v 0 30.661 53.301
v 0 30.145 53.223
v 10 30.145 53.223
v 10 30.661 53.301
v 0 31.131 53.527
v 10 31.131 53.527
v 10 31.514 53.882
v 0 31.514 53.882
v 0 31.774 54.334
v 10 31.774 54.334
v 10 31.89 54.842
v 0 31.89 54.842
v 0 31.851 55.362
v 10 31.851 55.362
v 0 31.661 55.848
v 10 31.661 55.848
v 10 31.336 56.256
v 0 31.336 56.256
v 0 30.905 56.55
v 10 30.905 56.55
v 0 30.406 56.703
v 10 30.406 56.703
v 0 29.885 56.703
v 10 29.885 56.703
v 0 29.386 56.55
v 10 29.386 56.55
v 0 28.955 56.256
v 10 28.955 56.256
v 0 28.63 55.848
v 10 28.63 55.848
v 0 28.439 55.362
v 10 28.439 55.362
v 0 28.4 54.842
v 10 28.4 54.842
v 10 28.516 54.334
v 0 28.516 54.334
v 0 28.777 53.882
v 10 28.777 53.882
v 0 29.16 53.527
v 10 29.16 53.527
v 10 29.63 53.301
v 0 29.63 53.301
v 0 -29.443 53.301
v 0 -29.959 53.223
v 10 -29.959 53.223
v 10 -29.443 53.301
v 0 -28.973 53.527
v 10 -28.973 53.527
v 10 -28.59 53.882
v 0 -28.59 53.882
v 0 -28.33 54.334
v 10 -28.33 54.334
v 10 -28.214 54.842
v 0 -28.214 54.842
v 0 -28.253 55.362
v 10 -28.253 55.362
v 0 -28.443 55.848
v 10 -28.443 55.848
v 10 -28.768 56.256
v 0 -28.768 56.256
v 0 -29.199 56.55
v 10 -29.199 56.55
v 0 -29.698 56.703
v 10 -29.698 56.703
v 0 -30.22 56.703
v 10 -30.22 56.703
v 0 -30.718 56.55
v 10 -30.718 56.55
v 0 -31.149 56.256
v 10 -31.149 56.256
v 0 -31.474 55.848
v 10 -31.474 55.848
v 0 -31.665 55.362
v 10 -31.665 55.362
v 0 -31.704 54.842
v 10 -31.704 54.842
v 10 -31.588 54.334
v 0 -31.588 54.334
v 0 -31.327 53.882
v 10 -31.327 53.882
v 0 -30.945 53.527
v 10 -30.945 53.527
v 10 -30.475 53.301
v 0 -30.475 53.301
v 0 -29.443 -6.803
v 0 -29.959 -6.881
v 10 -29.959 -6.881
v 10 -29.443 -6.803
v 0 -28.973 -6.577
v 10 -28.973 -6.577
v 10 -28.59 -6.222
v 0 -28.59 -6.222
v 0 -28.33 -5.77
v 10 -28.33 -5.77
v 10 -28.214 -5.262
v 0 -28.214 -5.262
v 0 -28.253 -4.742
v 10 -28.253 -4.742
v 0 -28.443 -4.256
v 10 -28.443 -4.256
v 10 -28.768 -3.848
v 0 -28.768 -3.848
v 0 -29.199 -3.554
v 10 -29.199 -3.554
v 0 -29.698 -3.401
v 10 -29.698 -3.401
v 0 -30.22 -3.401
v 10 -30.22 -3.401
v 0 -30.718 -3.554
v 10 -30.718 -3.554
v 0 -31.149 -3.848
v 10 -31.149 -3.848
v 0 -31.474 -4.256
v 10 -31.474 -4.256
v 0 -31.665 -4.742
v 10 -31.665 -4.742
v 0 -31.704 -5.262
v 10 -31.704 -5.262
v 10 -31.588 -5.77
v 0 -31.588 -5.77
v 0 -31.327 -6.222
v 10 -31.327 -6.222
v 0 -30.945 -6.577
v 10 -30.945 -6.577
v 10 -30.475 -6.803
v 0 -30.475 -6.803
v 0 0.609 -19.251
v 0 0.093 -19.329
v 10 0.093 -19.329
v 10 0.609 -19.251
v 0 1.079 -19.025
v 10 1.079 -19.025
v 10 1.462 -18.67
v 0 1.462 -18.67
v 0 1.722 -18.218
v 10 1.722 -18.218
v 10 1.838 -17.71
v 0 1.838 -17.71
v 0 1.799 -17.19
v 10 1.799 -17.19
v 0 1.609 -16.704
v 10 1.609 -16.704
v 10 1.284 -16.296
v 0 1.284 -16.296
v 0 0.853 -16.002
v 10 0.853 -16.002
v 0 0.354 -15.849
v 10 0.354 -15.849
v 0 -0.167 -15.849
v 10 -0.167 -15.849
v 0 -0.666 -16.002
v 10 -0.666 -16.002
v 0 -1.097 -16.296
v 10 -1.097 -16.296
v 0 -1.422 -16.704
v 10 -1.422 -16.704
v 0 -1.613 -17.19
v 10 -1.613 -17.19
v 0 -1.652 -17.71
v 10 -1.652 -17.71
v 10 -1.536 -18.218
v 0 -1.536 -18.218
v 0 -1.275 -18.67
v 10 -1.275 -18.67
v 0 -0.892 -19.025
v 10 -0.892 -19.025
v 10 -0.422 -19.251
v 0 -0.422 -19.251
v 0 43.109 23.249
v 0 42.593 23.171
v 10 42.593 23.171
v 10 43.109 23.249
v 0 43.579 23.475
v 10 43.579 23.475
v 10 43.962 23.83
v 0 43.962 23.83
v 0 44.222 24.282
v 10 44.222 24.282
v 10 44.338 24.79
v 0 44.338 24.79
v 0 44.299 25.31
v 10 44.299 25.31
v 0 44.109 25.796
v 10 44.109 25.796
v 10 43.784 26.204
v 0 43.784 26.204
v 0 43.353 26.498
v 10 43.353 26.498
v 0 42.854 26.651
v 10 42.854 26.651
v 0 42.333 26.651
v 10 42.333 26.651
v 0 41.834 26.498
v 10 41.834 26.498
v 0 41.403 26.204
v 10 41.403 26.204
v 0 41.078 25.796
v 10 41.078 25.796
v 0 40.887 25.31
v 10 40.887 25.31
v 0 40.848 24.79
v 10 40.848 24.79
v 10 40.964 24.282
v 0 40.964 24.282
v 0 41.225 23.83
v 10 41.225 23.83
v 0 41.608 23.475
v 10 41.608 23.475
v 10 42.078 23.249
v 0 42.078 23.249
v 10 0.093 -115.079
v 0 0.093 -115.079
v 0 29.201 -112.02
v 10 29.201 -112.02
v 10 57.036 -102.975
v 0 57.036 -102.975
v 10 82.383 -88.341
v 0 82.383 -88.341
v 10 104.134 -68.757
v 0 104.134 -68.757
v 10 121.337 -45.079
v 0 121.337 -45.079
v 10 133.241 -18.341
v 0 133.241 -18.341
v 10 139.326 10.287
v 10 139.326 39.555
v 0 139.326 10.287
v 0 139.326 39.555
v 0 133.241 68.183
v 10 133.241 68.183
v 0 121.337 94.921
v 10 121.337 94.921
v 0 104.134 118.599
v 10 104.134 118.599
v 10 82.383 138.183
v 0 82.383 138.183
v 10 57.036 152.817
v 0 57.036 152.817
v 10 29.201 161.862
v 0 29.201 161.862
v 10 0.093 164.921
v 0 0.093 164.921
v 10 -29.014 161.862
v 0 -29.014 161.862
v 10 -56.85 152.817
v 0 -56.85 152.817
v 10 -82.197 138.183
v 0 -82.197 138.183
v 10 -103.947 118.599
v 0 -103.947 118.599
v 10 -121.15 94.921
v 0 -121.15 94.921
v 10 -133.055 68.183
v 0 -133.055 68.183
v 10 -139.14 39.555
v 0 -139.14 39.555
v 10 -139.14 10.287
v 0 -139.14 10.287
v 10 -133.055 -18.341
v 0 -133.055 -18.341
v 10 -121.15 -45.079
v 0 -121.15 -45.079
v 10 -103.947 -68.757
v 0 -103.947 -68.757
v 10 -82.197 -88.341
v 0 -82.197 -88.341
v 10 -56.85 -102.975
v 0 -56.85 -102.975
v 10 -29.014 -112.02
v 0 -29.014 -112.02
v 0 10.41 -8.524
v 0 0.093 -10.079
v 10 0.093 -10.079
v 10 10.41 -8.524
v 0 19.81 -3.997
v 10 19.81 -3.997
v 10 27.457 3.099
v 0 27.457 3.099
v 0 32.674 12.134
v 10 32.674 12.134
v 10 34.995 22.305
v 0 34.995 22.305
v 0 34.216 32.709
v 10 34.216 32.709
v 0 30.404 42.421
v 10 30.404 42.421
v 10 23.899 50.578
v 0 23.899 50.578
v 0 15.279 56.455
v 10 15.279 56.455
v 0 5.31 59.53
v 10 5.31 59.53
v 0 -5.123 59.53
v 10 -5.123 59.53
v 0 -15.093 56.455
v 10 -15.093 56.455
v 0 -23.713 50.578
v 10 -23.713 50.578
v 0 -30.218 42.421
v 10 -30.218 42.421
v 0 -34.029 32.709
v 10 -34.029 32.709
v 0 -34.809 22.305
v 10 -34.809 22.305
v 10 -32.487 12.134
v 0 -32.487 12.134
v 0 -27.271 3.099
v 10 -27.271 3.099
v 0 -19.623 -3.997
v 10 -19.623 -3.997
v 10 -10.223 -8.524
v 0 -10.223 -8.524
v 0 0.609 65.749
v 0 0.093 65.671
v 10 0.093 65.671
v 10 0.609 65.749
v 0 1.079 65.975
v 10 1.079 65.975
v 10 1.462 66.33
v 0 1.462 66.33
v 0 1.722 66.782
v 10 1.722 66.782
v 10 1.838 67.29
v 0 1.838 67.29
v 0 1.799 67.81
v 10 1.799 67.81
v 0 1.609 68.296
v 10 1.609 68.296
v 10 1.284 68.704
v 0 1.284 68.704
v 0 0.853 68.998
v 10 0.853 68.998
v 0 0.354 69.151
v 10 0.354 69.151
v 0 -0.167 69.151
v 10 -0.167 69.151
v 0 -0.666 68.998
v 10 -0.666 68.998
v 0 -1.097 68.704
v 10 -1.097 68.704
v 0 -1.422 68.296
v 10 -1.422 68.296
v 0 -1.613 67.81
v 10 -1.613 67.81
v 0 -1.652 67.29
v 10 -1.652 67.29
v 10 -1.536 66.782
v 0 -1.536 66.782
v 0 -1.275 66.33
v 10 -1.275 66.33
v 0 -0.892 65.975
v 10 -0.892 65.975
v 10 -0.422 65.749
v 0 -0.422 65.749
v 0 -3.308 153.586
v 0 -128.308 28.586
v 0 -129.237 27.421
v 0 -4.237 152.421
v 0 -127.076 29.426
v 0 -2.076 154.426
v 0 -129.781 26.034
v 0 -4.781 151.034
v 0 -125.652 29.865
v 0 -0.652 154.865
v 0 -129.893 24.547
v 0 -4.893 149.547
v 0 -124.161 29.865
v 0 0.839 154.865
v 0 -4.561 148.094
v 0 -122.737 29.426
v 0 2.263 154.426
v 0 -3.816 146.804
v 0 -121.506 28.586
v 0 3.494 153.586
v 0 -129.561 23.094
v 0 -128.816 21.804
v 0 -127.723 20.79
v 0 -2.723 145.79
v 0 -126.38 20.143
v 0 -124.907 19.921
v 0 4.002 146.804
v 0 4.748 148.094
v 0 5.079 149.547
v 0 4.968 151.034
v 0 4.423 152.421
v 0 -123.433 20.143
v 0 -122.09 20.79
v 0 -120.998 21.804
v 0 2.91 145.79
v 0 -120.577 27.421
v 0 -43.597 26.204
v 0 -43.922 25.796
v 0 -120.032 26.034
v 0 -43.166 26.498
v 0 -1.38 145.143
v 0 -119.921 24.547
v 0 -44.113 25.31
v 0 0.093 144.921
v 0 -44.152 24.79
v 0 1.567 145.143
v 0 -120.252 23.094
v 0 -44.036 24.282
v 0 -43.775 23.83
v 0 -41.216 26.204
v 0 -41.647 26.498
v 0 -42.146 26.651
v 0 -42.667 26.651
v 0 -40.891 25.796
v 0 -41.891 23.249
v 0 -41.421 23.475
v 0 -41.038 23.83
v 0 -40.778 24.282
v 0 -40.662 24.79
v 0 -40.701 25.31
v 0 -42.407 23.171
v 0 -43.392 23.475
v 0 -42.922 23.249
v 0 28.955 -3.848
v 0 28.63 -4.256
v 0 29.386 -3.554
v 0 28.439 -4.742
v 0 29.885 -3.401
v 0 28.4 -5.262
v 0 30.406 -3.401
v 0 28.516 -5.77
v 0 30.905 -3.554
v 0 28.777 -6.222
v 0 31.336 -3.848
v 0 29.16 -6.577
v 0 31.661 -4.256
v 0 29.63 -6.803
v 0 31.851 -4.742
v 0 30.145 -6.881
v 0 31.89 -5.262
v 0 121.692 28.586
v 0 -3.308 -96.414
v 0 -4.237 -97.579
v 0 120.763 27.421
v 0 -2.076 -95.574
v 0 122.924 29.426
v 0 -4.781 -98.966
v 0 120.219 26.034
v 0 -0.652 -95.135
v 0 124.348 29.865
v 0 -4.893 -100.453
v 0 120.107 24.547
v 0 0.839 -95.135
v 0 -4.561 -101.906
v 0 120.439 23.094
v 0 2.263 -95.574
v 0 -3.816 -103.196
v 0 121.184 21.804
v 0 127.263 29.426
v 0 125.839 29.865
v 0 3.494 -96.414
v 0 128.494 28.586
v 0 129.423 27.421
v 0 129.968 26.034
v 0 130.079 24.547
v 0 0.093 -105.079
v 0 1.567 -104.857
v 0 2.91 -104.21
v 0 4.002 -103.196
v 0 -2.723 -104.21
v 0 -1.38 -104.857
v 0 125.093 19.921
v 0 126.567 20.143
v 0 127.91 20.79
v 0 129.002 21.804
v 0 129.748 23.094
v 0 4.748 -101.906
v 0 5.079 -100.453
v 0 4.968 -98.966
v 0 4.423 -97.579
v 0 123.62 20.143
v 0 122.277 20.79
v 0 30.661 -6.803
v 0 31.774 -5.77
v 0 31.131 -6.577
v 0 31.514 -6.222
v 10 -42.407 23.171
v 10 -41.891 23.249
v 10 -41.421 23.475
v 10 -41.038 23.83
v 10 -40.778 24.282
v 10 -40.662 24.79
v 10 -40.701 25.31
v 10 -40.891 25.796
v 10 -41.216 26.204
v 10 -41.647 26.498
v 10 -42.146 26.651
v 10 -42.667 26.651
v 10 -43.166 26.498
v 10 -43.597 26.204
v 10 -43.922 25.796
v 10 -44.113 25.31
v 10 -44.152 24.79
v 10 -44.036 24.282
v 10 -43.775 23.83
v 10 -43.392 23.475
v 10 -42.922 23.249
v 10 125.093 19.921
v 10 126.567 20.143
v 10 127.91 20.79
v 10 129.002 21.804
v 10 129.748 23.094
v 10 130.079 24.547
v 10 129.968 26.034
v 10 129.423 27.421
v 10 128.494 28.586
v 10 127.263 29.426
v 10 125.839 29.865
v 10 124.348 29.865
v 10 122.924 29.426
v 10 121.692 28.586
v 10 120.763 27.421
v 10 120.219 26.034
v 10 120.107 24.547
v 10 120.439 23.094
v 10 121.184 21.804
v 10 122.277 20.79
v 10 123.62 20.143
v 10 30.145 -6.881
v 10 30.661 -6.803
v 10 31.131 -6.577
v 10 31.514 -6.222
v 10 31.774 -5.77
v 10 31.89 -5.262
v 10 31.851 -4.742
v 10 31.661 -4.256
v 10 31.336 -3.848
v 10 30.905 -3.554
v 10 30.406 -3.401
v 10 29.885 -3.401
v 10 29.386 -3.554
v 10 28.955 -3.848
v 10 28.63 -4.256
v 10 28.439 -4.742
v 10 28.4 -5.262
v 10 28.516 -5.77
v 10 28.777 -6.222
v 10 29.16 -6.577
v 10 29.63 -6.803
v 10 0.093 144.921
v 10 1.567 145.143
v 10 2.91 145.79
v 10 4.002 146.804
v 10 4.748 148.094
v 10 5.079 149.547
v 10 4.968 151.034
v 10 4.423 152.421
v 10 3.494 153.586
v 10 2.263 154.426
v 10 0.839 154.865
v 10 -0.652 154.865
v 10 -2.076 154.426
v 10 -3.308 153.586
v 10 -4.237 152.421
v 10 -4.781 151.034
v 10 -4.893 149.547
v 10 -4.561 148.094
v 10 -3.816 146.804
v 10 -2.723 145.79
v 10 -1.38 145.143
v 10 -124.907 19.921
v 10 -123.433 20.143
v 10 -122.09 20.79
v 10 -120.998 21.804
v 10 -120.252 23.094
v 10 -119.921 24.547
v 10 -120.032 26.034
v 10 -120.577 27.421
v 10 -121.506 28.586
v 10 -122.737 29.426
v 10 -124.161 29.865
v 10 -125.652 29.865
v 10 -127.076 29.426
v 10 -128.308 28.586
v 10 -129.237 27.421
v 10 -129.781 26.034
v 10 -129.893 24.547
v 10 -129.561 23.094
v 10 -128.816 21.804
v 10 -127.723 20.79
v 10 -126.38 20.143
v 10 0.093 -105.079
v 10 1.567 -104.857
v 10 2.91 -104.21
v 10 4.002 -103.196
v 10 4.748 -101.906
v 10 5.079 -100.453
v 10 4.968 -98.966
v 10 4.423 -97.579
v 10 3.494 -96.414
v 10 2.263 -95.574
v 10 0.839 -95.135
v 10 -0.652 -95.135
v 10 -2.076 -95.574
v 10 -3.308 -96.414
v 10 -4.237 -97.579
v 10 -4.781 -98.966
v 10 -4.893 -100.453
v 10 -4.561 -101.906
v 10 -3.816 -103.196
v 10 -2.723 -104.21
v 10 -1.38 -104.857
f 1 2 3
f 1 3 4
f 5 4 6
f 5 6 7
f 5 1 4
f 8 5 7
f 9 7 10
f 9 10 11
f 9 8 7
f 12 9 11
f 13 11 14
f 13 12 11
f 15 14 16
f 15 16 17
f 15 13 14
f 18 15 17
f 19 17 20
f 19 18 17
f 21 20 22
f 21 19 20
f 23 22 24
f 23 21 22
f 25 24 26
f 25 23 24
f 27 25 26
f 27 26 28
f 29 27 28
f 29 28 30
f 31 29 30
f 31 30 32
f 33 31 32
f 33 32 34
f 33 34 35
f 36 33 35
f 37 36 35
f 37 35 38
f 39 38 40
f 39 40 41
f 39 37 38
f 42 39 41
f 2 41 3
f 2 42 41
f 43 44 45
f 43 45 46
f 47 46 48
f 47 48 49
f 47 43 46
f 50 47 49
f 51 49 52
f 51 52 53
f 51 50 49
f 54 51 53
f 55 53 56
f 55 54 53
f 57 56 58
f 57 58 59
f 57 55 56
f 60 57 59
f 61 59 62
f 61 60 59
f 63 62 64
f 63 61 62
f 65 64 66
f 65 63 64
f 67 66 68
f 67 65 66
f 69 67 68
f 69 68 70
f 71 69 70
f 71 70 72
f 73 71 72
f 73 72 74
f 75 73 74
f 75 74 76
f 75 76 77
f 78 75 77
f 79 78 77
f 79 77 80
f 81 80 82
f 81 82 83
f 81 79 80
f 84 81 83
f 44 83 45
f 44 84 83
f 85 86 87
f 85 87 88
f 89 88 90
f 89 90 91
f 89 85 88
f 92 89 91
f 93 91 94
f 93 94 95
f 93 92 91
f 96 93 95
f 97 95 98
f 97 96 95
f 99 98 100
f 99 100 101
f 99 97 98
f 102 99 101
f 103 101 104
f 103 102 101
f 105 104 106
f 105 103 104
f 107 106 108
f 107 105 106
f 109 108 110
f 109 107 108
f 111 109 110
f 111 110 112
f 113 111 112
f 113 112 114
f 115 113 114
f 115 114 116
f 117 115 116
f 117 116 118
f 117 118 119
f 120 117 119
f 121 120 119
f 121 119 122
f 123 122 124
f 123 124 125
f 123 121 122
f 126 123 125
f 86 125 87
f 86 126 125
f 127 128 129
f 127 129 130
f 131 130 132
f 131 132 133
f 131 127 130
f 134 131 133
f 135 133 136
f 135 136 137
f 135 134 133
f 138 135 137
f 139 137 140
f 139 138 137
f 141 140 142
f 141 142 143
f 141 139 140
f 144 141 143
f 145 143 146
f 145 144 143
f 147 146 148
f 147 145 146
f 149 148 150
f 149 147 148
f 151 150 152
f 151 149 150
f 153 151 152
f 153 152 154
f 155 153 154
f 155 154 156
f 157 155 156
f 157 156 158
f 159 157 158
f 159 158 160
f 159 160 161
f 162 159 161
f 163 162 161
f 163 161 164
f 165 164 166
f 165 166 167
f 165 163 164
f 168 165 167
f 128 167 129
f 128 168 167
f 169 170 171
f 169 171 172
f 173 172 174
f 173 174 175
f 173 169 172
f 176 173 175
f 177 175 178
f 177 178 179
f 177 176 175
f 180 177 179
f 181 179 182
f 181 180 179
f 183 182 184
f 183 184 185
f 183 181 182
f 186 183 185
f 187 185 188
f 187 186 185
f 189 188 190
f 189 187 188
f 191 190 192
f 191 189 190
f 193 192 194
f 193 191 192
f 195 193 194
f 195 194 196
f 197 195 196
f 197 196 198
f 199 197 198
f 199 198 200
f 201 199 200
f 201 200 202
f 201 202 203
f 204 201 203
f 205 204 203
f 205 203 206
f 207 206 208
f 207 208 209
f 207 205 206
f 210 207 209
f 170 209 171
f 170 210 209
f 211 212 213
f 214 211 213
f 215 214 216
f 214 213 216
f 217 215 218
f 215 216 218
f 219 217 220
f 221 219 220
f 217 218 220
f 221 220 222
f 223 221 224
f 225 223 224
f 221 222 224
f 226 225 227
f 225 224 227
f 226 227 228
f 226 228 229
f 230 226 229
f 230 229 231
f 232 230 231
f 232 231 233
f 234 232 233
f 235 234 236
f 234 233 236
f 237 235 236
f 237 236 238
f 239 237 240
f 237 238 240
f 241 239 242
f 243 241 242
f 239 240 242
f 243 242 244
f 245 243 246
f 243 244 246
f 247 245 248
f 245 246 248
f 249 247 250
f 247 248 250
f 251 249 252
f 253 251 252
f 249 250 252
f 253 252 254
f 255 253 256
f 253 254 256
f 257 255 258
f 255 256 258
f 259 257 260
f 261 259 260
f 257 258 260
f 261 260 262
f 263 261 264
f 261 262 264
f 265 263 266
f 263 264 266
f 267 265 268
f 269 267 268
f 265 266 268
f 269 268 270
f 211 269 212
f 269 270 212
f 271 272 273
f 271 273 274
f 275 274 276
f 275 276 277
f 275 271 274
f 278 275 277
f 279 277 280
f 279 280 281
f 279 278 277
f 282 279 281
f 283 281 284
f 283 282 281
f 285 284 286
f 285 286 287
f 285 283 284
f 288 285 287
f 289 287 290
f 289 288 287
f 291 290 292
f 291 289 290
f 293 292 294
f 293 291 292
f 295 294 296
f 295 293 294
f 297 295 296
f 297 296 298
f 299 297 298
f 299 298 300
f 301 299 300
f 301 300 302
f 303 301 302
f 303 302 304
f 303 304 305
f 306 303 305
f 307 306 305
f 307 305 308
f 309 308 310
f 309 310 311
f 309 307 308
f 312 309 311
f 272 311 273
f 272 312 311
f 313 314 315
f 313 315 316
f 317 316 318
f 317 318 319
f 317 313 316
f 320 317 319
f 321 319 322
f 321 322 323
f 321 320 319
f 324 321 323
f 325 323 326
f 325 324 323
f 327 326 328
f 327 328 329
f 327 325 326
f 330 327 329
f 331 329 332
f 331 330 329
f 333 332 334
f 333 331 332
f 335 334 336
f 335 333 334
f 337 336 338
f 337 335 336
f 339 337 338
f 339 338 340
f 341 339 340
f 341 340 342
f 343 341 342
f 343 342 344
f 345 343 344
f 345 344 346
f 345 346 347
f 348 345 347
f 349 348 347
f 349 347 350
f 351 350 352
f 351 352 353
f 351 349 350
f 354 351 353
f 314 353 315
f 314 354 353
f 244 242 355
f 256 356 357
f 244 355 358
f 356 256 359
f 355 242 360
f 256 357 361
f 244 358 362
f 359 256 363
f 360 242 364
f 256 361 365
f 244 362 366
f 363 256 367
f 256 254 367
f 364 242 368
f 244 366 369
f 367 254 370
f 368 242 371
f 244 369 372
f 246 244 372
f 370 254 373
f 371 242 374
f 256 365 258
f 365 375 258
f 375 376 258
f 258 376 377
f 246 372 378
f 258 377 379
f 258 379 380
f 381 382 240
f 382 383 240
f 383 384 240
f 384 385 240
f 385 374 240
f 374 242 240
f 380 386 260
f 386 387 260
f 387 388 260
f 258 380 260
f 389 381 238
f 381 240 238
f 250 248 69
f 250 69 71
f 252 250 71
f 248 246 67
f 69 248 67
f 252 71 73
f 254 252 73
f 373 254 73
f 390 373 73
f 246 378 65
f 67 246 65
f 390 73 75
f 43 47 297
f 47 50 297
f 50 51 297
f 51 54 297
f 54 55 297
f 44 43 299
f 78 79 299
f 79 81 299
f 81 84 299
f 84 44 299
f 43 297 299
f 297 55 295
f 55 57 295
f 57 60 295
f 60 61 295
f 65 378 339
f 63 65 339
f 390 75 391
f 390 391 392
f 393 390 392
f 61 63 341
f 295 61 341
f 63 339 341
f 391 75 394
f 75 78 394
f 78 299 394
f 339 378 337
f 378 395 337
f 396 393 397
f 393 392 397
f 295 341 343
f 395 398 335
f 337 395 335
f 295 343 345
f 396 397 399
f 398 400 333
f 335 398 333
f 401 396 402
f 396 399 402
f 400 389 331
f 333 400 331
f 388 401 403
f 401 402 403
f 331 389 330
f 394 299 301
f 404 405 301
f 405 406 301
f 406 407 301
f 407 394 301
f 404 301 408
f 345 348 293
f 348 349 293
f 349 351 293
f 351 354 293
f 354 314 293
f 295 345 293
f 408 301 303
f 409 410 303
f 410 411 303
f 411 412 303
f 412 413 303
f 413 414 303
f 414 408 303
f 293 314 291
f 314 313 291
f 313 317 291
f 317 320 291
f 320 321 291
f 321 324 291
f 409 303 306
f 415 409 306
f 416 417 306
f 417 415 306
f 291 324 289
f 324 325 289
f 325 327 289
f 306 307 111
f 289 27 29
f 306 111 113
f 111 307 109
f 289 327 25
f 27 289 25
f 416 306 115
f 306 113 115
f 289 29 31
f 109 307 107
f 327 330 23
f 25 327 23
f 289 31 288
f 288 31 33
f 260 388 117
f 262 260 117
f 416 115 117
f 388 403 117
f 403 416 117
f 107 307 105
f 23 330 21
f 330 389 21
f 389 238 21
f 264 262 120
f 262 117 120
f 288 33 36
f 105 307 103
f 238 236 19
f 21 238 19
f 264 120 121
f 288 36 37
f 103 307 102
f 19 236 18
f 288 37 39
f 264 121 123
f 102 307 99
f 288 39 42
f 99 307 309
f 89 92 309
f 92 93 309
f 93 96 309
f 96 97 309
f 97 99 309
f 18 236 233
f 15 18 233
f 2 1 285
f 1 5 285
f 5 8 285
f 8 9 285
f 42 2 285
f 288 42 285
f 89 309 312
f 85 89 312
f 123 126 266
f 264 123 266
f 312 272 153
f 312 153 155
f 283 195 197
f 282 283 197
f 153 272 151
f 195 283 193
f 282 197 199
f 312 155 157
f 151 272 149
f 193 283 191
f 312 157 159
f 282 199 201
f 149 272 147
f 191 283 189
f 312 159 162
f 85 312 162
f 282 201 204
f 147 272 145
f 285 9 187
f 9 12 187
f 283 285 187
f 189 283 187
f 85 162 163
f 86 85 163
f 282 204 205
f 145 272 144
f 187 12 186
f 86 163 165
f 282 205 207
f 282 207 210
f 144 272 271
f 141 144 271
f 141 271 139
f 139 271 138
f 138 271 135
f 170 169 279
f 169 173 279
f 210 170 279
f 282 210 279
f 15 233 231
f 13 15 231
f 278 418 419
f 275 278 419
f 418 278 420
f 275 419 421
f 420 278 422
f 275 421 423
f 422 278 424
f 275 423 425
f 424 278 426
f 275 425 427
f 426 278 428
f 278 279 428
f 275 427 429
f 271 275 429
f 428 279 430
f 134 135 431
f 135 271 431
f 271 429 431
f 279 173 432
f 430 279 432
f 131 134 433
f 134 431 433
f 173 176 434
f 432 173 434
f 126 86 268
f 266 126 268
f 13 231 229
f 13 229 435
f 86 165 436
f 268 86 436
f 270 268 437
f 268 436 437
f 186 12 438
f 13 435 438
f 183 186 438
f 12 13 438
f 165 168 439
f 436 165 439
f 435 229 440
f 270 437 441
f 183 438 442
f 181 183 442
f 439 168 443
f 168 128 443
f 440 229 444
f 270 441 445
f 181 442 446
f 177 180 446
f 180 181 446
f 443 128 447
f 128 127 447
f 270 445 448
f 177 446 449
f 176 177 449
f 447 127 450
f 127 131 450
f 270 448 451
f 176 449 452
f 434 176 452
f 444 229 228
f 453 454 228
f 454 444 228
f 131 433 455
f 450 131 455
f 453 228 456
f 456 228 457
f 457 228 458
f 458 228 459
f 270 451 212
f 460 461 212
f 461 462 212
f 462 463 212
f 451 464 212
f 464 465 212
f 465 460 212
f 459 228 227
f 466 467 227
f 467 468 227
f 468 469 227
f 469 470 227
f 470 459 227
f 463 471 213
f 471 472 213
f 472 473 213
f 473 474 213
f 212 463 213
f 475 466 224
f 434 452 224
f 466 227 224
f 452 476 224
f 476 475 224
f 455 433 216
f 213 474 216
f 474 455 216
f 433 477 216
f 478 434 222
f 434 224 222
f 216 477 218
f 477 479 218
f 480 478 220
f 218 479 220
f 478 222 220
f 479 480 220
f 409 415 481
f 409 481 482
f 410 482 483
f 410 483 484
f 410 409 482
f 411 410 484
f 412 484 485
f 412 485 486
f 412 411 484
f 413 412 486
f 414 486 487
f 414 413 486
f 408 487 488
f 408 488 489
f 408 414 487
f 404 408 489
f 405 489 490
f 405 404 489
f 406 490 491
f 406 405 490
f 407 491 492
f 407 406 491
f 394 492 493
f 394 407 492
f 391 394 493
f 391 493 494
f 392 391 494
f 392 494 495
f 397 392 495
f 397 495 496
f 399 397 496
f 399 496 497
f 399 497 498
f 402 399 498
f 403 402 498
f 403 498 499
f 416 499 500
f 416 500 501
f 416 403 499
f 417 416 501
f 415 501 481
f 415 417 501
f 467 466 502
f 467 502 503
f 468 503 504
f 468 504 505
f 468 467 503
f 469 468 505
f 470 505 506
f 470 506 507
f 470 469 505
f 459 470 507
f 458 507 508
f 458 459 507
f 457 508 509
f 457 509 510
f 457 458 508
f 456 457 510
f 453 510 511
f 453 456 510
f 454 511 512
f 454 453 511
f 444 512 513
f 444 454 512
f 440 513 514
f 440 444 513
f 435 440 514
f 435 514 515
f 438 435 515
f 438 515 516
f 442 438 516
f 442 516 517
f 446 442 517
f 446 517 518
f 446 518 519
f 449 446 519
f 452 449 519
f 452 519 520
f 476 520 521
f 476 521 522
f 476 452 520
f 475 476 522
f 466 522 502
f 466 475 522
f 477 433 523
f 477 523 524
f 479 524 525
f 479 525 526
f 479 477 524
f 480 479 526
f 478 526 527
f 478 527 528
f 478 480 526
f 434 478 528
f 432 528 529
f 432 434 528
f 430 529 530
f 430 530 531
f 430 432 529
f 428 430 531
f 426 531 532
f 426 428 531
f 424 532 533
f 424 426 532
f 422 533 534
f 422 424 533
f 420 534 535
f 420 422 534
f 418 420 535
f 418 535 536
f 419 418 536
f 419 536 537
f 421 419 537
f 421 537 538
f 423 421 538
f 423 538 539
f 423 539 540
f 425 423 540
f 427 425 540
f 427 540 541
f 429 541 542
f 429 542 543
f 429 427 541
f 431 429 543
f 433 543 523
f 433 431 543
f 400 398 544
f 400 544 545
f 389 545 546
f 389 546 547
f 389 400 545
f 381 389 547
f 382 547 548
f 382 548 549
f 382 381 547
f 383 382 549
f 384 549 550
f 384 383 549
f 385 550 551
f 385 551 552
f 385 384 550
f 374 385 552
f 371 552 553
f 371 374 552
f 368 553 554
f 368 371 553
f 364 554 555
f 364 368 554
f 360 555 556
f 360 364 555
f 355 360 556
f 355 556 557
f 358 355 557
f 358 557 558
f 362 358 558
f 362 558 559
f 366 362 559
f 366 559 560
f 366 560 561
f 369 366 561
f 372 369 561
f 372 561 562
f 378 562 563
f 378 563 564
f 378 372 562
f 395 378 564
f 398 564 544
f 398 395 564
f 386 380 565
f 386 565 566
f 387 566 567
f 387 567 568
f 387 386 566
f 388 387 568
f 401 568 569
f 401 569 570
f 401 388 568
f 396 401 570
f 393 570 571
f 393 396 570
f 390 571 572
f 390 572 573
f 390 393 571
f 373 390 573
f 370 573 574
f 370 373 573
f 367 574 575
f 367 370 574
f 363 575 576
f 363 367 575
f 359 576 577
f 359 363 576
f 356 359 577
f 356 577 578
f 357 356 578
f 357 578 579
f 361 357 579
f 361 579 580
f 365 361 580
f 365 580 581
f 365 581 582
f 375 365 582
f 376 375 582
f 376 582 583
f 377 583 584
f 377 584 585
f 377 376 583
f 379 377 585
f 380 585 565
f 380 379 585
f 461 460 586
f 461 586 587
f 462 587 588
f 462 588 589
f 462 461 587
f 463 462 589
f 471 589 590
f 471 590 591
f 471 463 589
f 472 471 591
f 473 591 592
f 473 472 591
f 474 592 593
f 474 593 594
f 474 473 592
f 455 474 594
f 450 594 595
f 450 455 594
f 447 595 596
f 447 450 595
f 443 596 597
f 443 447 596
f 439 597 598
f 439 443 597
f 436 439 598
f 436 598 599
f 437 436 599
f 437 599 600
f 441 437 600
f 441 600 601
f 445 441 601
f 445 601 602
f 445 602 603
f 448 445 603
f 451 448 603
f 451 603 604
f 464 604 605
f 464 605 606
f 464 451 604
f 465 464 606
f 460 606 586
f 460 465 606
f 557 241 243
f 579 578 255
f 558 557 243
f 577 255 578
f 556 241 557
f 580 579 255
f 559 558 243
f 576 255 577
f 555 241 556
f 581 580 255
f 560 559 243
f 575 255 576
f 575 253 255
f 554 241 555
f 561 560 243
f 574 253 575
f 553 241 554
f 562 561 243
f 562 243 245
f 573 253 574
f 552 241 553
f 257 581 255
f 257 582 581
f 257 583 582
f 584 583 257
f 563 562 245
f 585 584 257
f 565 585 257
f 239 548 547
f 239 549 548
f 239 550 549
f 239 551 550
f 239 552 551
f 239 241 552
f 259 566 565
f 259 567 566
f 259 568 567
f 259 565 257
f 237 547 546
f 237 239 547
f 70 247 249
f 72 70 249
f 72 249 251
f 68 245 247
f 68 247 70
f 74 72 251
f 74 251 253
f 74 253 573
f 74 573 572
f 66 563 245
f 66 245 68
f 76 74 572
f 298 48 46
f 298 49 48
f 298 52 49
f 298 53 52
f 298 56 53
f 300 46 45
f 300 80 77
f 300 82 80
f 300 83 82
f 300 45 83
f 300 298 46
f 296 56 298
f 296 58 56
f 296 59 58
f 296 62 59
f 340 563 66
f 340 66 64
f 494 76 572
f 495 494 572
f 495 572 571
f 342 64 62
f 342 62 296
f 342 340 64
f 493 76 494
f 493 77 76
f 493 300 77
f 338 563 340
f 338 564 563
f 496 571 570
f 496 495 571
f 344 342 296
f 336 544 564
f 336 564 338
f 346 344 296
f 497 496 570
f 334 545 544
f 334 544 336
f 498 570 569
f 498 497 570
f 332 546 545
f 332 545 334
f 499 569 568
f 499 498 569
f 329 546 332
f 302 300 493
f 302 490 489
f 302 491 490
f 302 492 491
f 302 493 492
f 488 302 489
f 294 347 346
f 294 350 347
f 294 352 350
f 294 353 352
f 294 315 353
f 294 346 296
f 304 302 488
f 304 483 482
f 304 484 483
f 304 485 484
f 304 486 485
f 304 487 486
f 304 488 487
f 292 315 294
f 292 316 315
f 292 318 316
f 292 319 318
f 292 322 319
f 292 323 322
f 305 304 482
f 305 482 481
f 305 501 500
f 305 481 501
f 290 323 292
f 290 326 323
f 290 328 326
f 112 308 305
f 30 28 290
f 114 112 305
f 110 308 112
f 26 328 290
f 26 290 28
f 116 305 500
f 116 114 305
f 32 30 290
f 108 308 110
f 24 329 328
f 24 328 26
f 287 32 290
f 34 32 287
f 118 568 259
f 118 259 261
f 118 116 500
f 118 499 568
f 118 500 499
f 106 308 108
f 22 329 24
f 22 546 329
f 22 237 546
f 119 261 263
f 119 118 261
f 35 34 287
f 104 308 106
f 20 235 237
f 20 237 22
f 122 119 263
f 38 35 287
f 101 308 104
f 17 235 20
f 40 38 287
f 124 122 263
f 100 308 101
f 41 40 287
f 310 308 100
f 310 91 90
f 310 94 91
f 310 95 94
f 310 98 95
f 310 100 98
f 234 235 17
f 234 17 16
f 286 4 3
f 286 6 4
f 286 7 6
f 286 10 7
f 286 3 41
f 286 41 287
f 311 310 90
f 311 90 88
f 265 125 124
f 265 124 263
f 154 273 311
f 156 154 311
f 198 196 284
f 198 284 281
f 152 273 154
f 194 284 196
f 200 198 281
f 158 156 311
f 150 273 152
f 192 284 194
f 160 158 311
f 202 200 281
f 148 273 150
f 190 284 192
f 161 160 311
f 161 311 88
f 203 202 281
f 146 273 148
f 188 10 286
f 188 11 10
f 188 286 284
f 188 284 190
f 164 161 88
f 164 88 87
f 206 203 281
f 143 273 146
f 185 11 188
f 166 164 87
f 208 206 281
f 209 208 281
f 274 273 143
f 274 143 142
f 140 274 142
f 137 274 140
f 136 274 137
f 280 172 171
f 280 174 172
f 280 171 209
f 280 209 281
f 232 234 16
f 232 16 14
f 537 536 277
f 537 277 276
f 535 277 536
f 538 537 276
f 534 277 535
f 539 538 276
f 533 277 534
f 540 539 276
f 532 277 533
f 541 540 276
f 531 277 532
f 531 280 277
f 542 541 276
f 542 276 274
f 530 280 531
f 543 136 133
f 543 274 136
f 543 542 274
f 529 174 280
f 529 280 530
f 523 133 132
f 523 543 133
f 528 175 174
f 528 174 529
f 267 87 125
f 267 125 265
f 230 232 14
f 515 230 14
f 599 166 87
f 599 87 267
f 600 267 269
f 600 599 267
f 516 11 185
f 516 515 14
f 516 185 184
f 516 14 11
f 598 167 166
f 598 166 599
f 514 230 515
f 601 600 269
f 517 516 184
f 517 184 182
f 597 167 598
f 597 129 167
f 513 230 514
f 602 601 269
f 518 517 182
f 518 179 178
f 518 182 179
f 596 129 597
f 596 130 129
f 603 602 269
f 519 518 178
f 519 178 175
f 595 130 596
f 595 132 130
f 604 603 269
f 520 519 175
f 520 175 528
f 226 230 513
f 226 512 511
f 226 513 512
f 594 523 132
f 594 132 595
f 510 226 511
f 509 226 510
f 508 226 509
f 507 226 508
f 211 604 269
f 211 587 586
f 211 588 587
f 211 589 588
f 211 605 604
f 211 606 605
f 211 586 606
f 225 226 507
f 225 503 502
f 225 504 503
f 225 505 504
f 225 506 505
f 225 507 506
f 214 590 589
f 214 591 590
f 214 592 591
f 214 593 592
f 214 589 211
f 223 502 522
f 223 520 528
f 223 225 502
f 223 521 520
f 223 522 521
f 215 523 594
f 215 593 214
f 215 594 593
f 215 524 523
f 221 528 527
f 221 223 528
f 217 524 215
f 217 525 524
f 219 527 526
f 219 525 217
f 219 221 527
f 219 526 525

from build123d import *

# Parameters (mm, degrees)
SKETCH_1_R      = 140
SKETCH_1_R_2    = 35
SKETCH_1_R_3    = 1.75
SKETCH_1_R_4    = 5
EXTRUDE_1_DEPTH = 10


with BuildPart() as part:
    # 草图1 → 凸台-拉伸1 (new body)
    with BuildSketch(Plane(origin=(0, 0, 0), x_dir=(0, 0, -1), z_dir=(1, 0, 0))):
        with Locations((-24.920952127, 0.093336899)):
            Circle(SKETCH_1_R)
        with Locations((-24.920952127, 0.093336899)):
            Circle(SKETCH_1_R_2, mode=Mode.SUBTRACT)
        with Locations((-24.920952127, 42.593336899)):
            Circle(SKETCH_1_R_3, mode=Mode.SUBTRACT)
        with Locations((5.131086073, 30.1453751)):
            Circle(SKETCH_1_R_3, mode=Mode.SUBTRACT)
        with Locations((17.579047873, 0.093336899)):
            Circle(SKETCH_1_R_3, mode=Mode.SUBTRACT)
        with Locations((5.131086073, -29.958701301)):
            Circle(SKETCH_1_R_3, mode=Mode.SUBTRACT)
        with Locations((-24.920952127, -42.406663101)):
            Circle(SKETCH_1_R_3, mode=Mode.SUBTRACT)
        with Locations((-54.972990328, -29.958701301)):
            Circle(SKETCH_1_R_3, mode=Mode.SUBTRACT)
        with Locations((-67.420952127, 0.093336899)):
            Circle(SKETCH_1_R_3, mode=Mode.SUBTRACT)
        with Locations((-54.972990328, 30.1453751)):
            Circle(SKETCH_1_R_3, mode=Mode.SUBTRACT)
        with Locations((-149.920952127, 0.093336899)):
            Circle(SKETCH_1_R_4, mode=Mode.SUBTRACT)
        with Locations((-24.920952127, 125.093336899)):
            Circle(SKETCH_1_R_4, mode=Mode.SUBTRACT)
        with Locations((100.079047873, 0.093336899)):
            Circle(SKETCH_1_R_4, mode=Mode.SUBTRACT)
        with Locations((-24.920952127, -124.906663101)):
            Circle(SKETCH_1_R_4, mode=Mode.SUBTRACT)
    extrude(amount=EXTRUDE_1_DEPTH)


solid = part.part
